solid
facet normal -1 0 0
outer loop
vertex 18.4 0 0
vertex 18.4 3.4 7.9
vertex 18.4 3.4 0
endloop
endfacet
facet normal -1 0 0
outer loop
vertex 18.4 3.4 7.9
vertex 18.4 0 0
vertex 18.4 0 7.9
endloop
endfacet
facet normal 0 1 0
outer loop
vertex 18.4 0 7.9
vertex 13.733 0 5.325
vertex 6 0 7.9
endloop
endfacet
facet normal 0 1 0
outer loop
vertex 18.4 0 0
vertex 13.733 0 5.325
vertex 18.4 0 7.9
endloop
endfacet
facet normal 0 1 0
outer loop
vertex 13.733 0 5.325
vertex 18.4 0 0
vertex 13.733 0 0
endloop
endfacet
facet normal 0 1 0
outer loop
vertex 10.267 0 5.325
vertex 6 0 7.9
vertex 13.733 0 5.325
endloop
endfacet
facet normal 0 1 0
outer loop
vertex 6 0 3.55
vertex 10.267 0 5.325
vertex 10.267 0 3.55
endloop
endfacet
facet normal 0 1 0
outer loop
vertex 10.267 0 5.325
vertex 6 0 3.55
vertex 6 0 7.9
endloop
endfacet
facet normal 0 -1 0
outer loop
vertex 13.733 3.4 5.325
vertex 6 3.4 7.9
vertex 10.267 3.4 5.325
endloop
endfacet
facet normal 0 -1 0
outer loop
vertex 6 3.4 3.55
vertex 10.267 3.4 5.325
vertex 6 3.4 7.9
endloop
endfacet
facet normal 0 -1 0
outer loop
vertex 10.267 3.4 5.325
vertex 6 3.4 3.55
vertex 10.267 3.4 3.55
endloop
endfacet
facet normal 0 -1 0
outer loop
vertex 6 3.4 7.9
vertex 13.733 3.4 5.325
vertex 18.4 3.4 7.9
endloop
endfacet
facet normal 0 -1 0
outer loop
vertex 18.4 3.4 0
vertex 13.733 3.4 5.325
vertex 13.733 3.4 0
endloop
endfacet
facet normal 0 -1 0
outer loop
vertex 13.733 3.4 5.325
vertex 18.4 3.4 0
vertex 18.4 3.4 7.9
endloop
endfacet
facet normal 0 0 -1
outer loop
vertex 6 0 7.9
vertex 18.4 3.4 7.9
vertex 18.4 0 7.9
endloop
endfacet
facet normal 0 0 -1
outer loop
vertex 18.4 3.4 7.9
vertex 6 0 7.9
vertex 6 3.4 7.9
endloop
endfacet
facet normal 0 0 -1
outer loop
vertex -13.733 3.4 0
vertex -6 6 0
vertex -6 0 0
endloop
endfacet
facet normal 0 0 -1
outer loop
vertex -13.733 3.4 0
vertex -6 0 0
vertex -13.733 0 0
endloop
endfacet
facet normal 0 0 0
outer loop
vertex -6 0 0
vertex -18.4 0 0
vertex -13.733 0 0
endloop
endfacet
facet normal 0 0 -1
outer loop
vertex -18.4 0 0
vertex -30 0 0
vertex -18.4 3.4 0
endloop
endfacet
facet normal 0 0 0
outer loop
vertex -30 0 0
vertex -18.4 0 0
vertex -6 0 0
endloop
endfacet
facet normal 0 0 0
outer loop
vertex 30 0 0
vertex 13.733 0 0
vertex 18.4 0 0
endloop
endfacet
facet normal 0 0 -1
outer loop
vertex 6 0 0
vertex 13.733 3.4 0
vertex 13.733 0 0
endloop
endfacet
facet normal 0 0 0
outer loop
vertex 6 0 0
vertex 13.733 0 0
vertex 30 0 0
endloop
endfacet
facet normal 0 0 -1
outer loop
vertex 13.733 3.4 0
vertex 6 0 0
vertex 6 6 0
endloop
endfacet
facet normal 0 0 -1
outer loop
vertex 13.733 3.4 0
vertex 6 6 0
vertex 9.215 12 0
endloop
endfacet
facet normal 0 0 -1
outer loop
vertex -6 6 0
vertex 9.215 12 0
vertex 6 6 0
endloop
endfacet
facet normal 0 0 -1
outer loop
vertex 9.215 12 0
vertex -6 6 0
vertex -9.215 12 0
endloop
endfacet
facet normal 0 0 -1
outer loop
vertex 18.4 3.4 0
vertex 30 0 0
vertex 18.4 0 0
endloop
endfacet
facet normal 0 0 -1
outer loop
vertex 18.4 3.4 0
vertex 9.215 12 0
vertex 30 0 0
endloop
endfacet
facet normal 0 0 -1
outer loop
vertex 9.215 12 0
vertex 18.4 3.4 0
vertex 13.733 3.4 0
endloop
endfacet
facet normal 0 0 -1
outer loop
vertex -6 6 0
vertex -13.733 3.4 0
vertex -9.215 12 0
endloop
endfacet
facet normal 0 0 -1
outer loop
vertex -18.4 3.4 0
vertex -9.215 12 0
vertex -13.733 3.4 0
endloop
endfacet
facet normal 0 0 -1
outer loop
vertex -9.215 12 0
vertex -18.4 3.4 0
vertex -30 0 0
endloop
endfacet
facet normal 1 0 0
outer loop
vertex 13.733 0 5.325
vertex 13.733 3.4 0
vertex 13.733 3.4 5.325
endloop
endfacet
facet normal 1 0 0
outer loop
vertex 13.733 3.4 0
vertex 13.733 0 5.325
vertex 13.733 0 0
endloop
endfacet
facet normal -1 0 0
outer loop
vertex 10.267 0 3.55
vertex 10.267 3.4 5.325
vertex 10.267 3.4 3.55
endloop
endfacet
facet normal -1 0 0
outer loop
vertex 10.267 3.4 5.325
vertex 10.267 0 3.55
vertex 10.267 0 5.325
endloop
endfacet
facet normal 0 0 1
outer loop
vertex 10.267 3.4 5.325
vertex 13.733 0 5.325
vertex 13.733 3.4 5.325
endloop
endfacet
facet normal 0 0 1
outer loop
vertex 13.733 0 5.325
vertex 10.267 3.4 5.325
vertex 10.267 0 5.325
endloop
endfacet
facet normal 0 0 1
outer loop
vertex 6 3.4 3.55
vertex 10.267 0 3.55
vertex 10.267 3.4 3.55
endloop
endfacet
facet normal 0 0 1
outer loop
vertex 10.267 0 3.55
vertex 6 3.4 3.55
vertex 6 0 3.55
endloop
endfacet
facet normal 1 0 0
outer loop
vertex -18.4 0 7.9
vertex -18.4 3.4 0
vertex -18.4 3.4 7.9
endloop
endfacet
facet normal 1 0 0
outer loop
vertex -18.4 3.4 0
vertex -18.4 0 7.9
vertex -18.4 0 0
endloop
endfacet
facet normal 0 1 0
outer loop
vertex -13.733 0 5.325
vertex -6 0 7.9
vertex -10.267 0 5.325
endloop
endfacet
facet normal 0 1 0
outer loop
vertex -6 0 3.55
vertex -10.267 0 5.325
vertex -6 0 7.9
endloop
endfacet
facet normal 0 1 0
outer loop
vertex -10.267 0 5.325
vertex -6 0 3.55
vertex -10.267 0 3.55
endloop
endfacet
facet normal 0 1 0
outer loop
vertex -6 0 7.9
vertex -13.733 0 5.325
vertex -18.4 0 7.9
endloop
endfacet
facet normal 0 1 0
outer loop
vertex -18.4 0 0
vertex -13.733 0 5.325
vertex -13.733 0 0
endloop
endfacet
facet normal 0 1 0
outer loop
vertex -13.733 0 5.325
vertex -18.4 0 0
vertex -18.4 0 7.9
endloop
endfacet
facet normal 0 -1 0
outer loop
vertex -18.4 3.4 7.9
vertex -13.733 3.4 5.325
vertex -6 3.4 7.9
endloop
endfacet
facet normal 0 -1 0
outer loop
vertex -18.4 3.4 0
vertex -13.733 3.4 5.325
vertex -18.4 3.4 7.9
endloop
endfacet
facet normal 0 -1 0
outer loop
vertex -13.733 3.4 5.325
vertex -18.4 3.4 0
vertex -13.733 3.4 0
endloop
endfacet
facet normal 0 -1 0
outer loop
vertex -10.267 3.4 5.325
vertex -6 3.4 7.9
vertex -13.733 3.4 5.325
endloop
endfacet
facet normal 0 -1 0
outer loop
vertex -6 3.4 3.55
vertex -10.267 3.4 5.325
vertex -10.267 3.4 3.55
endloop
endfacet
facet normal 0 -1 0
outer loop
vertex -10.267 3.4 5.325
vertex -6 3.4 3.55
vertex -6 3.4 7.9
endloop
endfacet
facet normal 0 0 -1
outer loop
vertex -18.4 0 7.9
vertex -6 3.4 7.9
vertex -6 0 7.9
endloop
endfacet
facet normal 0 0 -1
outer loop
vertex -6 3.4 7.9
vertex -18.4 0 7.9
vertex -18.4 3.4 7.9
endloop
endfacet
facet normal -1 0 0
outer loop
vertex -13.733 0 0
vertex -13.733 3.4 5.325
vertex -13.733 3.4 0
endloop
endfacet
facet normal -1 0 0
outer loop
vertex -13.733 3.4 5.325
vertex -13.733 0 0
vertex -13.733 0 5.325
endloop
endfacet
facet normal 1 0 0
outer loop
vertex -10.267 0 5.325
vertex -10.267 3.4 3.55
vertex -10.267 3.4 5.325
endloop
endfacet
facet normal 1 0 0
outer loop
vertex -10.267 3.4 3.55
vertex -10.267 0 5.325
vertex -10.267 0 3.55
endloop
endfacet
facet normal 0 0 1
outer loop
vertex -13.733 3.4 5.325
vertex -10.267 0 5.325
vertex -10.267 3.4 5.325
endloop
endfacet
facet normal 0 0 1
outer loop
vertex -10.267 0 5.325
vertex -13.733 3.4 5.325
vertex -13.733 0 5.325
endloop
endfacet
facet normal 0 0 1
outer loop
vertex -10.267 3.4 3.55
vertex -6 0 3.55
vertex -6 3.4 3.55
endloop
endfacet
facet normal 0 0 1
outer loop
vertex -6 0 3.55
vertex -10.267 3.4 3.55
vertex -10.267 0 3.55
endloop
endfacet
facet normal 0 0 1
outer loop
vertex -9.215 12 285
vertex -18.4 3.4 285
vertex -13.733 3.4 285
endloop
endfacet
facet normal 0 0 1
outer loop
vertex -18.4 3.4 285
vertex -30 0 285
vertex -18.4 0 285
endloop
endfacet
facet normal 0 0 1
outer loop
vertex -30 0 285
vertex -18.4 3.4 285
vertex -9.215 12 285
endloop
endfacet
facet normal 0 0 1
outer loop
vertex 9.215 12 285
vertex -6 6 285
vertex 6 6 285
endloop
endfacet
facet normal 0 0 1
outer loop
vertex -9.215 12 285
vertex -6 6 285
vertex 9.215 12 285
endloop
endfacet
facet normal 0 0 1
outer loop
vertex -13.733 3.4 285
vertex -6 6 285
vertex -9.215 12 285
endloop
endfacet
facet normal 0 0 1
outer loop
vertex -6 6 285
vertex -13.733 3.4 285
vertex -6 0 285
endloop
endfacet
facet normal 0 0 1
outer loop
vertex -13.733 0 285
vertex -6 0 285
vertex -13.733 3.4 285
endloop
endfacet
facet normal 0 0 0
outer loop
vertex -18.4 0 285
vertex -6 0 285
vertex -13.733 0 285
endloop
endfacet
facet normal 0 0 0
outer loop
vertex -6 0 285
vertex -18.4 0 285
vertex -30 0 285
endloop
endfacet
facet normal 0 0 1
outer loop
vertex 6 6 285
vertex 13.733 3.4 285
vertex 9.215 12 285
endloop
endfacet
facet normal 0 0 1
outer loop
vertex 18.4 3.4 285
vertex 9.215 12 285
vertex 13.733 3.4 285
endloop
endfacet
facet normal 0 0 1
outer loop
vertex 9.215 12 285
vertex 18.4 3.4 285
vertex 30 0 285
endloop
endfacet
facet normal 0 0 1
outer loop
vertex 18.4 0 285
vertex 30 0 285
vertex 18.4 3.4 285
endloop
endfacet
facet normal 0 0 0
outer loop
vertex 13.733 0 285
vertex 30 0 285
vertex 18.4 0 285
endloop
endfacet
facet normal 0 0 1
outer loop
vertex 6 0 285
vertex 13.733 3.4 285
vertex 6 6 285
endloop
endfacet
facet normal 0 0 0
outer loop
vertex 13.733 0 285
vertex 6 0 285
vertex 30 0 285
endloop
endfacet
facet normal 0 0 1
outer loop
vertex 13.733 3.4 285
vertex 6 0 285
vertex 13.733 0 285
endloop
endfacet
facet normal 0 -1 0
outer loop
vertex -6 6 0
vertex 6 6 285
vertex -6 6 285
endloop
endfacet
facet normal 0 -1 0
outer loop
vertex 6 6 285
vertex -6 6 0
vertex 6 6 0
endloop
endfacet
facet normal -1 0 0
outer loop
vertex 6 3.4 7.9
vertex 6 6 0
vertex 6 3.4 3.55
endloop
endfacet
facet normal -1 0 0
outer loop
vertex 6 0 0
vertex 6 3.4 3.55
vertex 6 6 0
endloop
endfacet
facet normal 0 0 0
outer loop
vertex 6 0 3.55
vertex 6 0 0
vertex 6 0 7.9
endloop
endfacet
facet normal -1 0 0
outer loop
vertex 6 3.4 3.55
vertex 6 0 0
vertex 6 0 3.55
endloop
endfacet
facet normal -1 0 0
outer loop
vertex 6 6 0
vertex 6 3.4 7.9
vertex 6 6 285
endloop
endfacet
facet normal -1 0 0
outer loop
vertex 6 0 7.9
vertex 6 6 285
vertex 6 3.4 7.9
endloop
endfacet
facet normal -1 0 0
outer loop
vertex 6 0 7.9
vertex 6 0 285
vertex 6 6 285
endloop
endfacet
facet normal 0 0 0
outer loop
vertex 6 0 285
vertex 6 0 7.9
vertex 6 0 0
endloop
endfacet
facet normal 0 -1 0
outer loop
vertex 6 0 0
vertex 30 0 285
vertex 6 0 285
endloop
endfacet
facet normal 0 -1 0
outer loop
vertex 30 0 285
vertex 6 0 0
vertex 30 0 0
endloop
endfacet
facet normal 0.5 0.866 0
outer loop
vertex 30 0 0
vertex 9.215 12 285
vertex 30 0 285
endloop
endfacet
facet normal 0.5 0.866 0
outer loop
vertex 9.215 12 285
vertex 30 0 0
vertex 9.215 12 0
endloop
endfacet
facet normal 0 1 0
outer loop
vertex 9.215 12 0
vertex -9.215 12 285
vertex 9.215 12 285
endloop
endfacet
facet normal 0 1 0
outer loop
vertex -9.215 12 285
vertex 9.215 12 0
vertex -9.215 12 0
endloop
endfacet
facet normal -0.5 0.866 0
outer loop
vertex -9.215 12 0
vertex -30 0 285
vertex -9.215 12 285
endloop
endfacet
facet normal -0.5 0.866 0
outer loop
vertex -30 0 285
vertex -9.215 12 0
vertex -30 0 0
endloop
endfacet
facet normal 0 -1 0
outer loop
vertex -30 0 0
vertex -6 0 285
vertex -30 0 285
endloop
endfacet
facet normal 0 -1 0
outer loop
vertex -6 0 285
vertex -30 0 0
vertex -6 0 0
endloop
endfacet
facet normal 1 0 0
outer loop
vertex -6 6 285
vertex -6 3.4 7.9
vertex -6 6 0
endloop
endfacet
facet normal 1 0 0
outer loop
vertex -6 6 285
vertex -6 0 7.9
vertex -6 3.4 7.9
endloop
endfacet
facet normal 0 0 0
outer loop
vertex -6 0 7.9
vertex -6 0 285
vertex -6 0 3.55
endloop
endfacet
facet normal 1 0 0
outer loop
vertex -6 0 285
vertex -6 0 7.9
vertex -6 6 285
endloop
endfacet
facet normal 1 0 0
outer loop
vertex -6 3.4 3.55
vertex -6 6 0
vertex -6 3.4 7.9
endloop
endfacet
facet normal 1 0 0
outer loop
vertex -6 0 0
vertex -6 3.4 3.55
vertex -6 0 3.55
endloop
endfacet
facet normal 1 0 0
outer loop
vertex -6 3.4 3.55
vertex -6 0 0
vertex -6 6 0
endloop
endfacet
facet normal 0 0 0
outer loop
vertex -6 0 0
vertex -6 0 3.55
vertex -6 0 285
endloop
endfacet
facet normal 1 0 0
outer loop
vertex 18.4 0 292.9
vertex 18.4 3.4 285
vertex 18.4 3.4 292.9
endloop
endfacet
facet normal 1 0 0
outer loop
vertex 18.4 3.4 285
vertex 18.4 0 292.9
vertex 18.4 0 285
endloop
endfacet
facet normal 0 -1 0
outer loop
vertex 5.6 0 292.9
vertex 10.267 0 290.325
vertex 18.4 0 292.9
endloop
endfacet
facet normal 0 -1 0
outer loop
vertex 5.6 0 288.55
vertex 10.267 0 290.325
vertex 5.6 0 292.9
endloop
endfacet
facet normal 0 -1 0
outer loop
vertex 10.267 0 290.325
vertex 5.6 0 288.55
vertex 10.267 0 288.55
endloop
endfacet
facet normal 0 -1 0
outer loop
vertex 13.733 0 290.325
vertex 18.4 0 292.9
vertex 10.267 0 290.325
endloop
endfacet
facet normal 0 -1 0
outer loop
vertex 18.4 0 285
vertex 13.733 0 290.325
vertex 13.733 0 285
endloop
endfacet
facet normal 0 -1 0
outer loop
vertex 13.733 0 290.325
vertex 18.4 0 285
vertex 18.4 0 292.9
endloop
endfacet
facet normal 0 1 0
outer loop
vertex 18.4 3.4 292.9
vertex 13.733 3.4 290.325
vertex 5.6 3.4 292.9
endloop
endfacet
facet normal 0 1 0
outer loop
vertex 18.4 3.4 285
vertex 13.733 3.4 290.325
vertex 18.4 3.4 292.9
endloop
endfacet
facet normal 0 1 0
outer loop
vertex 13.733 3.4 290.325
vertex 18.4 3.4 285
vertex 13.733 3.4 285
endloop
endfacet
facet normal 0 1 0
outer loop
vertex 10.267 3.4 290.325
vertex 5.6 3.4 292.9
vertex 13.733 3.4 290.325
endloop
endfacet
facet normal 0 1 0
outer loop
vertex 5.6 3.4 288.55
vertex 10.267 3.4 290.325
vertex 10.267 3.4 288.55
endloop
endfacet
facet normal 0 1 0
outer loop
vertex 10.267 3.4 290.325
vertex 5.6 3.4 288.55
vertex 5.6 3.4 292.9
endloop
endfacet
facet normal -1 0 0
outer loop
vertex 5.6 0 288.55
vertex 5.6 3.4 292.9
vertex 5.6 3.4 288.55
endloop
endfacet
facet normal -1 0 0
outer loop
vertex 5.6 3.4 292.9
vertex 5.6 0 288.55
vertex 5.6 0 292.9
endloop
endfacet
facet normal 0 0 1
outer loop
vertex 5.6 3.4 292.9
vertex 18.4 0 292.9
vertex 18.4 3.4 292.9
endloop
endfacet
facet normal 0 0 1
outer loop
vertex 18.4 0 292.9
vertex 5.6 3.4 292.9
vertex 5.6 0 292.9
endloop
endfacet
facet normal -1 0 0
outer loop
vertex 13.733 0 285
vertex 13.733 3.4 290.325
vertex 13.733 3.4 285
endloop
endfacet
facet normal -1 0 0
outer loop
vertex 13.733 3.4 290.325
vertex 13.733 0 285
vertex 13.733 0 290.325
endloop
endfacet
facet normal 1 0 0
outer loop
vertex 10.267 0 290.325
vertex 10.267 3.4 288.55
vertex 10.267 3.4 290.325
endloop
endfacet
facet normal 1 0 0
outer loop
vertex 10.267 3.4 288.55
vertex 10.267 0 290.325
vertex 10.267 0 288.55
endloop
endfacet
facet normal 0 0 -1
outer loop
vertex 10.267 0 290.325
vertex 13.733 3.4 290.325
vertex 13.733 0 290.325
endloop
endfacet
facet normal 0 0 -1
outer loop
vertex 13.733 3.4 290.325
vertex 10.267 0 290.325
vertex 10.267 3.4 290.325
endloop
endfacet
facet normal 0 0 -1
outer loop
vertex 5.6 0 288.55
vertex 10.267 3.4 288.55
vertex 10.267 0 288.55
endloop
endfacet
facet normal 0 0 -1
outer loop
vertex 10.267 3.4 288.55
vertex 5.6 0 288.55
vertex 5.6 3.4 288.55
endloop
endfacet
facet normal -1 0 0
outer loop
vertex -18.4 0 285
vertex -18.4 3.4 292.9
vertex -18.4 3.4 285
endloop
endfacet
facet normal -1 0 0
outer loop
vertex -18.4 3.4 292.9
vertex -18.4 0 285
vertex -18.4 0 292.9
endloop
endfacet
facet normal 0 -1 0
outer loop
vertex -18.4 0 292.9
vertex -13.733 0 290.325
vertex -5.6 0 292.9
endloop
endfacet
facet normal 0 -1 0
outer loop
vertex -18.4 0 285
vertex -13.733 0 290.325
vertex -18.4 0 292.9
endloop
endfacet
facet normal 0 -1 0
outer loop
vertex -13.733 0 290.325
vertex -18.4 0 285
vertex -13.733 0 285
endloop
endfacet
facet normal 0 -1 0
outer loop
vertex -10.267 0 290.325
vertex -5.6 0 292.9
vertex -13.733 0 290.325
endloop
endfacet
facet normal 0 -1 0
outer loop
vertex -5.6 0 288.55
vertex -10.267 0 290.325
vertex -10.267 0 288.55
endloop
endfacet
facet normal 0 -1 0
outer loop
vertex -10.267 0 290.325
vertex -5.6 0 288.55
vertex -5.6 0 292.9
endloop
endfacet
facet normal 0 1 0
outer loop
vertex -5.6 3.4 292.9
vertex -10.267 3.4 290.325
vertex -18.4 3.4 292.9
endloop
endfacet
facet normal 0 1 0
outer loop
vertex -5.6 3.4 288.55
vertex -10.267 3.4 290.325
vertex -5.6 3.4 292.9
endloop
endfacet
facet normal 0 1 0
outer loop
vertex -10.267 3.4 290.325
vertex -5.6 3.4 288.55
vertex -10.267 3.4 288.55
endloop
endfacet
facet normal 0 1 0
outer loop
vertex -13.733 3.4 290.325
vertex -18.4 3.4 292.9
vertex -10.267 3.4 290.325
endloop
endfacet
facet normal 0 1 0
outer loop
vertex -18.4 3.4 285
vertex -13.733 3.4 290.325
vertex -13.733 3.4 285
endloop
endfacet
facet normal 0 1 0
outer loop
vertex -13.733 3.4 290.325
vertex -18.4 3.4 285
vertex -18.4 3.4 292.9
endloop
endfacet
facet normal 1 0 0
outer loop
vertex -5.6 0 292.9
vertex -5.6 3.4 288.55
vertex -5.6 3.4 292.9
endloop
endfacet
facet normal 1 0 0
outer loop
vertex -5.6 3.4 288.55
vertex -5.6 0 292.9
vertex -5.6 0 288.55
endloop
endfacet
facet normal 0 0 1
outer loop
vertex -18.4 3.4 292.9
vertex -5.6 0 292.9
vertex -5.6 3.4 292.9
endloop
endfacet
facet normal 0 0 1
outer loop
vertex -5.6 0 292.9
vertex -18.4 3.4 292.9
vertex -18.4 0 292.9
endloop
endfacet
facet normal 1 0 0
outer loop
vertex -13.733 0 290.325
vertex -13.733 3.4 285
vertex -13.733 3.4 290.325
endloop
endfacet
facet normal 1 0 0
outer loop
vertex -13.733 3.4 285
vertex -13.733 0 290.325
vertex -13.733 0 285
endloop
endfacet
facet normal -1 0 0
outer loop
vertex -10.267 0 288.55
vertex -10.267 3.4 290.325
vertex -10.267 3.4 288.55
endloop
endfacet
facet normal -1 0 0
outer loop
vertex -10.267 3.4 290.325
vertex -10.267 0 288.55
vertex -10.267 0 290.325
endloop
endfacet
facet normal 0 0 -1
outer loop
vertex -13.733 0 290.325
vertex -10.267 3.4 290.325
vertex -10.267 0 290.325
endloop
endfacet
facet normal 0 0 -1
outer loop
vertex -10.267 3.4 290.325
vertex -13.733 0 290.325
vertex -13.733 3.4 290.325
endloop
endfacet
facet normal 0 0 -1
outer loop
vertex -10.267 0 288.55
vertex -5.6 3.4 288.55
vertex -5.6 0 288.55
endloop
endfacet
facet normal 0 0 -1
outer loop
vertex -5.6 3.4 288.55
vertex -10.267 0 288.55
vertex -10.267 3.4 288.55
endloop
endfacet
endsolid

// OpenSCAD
// file: ../scripts/trapezium.scad
/**
 * @file trapezium.scad
 * @brief Create a trapezium shape with the given parameters
 * @copyright Cameron K. Brooks 2025
 * @description Create a trapezium shape given the bottom width and optionally the top width, height, angle, and offset.
 * The default call using only the bottom width will create a trapezium with a top width equal to half the bottom width
 * and a height calculated from the default angle of 45 degrees.
 */

/**
 * @brief Create a trapezium shape with the given parameters
 * @param bottom_width The width of the bottom of the trapezium
 * @param top_width The width of the top of the trapezium
 * @param height The height of the trapezium
 * @param angle The angle of the trapezium sides
 * @param offset The offset of the top of the trapezium
 * @return The trapezium polygon
 */
module trapezium(bottom_width, top_width = undef, height = undef, angle = 45, offset = 0) {
    // Calculate missing parameter based on the provided inputs
    // First calculate the top width if it is not provided
    top_width =
        is_undef(top_width) ? // check top_width undef
            (
                is_undef(height) // check if height is undef
                ? bottom_width / 2 // if height is also undef, set top width to half of bottom width
                : bottom_width - 2 * height * tan(angle)
            ) // if height is provided, calculate top width
        : top_width; // if top width is provided, use it

    // Next calculate height if it is not provided
    height =
        is_undef(height) ? // check if height is undef
            (bottom_width - top_width) / (2 * tan(angle)) // calculate height based on the angle and width difference
        : height; // if height is provided, use it

    polygon(
        points=[
            [-bottom_width / 2, 0], // Bottom left
            [bottom_width / 2, 0], // Bottom right
            [offset + top_width / 2, height], // Top right
            [offset - top_width / 2, height], // Top left
        ]
    );
}

/**
 * @brief Create a list of points that form a trapezium shape with the given parameters
 * @param bottom_width The width of the bottom of the trapezium
 * @param top_width The width of the top of the trapezium
 * @param height The height of the trapezium
 * @param angle The angle of the trapezium sides
 * @param offset The offset of the top of the trapezium
 * @return The points of the trapezium shape
 */
function trapezium_pts(bottom_width, top_width = undef, height = undef, angle = 45, offset = 0) =
    let (
        top_width = is_undef(top_width) ? // check top_width undef
            (
                is_undef(height) // check if height is undef
                ? bottom_width / 2 // if height is also undef, set top width to half of bottom width
                : bottom_width - 2 * height * tan(angle)
            ) // if height is provided, calculate top width
        : top_width, // if top width is provided, use it

        // Next calculate height if it is not provided
        height = is_undef(height) ? // check if height is undef
            (bottom_width - top_width) / (2 * tan(angle)) // calculate height based on the angle and width difference
        : height // if height is provided, use it
    ) [
            [-bottom_width / 2, 0], // Bottom left
            [bottom_width / 2, 0], // Bottom right
            [offset + top_width / 2, height], // Top right
            [offset - top_width / 2, height], // Top left
    ];

// -----------------------------------------
// Example usage of the trapezium module
// -----------------------------------------

// Shared offset parameter, shifts the top of the trapezium left (-) or right (+)
example_offset = 0;

// Default call using bottom_width, top_width, height
translate([0, 0, 0]) trapezium(bottom_width=40, top_width=25, height=12, offset=example_offset);

// Call using bottom_width, top_width, angle
translate([0, 20, 0]) trapezium(bottom_width=40, top_width=25, angle=30, offset=example_offset);

// Call using bottom_width, top_width; here height is calculated from default angle (45) and widths
translate([0, 40, 0]) trapezium(bottom_width=40, top_width=25, offset=example_offset);

// Call using bottom_width, angle; here top_width = bottom_width / 2, height is calculated from angle and widths
translate([0, 60, 0]) trapezium(bottom_width=40, angle=60, offset=example_offset);

// Call using bottom_width and height; here top_width is calculated from default angle (45) and widths
translate([0, 80, 0]) trapezium(bottom_width=40, height=12, offset=example_offset);

// Call using bottom_width only; top_width = bottom_width / 2, height is calculated from default angle (45) and widths
translate([0, 100, 0]) trapezium(bottom_width=40, offset=example_offset);

// They can also be called analogously as a function
// Default call using bottom_width, top_width, height
translate([50, 0, 0]) polygon(trapezium_pts(bottom_width=40, top_width=25, height=12, offset=example_offset));

// Call using bottom_width, top_width, angle
translate([50, 20, 0]) polygon(trapezium_pts(bottom_width=40, top_width=25, angle=30, offset=example_offset));

// Call using bottom_width, top_width; here height is calculated from default angle (45) and widths
translate([50, 40, 0]) polygon(trapezium_pts(bottom_width=40, top_width=25, offset=example_offset));

// Call using bottom_width, angle; here top_width = bottom_width / 2, height is calculated from angle and widths
translate([50, 60, 0]) polygon(trapezium_pts(bottom_width=40, angle=60, offset=example_offset));

// Call using bottom_width and height; here top_width is calculated from default angle (45) and widths
translate([50, 80, 0]) polygon(trapezium_pts(bottom_width=40, height=12, offset=example_offset));

// Call using bottom_width only; top_width = bottom_width / 2, height is calculated from default angle (45) and widths
translate([50, 100, 0]) polygon(trapezium_pts(bottom_width=40, offset=example_offset));
// main file
use <../scripts/trapezium.scad>

$fn = $preview ? 32 : 64;
z_fight = $preview ? 0.05 : 0;

function circular_array_shift(arr, shift) =
    let (len = len(arr)) [for (i = [0:len - 1]) arr[ (i + shift) % len]];

function square_pts(width, height) =
    [
        [width / 2, 0],
        [width / 2, height],
        [-width / 2, height],
        [-width / 2, 0],
    ];

cord_cross_section_bounding_width = 12;
cord_cross_section_bounding_height = 6;
length = 300;
wall_thickness = 6;

module cord_protector(allow = 0.4, trap_length_factor = 0.95) {

    trap_width = cord_cross_section_bounding_width * 5;
    trap_height = cord_cross_section_bounding_height + wall_thickness;

    trap_pts = trapezium_pts(bottom_width=trap_width, height=trap_height, angle=60);

    shifted_pts = circular_array_shift(trap_pts, 1);

    // prepend points on single shifted trap pts list to insert cut out along bottom edge
    square_cut_pts = square_pts(cord_cross_section_bounding_width, cord_cross_section_bounding_height);
    cut_trap_pts = concat(square_cut_pts, shifted_pts);

    trap_length = (length * trap_length_factor);

    module j_conn_local(w, l, h, allowance = 0) {
        // Connector end
        for (i = [0, 1])
            mirror([i, 0, 0])
                translate([w / 2, h, 0])
                    rotate([90, 0, 0])
                        j_connector(w, l, h, allowance);
    }

    union() {
        difference() {
            // Main trapezium body
            linear_extrude(height=trap_length)
                polygon(cut_trap_pts);

            // Cut connectors from other side
            #translate([0, -z_fight / 2, -z_fight / 2])
                j_conn_local(w=cord_cross_section_bounding_width, l=(length * (1 - trap_length_factor)) / 2, h=cord_cross_section_bounding_height / 2, allowance=allow);
        }
        translate([0, 0, trap_length])
            j_conn_local(w=cord_cross_section_bounding_width, l=(length * (1 - trap_length_factor)) / 2, h=cord_cross_section_bounding_height / 2, allowance=allow);
    }
}

module j_connector(width, length, height, allowance = 0) {
    _width_p = width + allowance * 2;
    _length_p = length + allowance;
    _height_p = height + allowance;
    _width_n = width - allowance * 4;
    _length_n = length - allowance;
    _height_n = height - allowance;

    translate([-allowance, 0, -allowance])
        difference() {
            cube([_width_p, _length_p, _height_p]);

            translate([_width_p * 1 / 3 + allowance, -z_fight, -z_fight / 2])
                cube([_width_n * 1 / 3 + z_fight, _length_n * 3 / 4 + z_fight, _height_p + z_fight]);

            translate([-z_fight / 2, -z_fight, -z_fight / 2])
                cube([_width_p * 1 / 3 + allowance + z_fight, _length_n * 1 / 2 + z_fight, _height_p + z_fight]);
        }
}

cord_protector();
